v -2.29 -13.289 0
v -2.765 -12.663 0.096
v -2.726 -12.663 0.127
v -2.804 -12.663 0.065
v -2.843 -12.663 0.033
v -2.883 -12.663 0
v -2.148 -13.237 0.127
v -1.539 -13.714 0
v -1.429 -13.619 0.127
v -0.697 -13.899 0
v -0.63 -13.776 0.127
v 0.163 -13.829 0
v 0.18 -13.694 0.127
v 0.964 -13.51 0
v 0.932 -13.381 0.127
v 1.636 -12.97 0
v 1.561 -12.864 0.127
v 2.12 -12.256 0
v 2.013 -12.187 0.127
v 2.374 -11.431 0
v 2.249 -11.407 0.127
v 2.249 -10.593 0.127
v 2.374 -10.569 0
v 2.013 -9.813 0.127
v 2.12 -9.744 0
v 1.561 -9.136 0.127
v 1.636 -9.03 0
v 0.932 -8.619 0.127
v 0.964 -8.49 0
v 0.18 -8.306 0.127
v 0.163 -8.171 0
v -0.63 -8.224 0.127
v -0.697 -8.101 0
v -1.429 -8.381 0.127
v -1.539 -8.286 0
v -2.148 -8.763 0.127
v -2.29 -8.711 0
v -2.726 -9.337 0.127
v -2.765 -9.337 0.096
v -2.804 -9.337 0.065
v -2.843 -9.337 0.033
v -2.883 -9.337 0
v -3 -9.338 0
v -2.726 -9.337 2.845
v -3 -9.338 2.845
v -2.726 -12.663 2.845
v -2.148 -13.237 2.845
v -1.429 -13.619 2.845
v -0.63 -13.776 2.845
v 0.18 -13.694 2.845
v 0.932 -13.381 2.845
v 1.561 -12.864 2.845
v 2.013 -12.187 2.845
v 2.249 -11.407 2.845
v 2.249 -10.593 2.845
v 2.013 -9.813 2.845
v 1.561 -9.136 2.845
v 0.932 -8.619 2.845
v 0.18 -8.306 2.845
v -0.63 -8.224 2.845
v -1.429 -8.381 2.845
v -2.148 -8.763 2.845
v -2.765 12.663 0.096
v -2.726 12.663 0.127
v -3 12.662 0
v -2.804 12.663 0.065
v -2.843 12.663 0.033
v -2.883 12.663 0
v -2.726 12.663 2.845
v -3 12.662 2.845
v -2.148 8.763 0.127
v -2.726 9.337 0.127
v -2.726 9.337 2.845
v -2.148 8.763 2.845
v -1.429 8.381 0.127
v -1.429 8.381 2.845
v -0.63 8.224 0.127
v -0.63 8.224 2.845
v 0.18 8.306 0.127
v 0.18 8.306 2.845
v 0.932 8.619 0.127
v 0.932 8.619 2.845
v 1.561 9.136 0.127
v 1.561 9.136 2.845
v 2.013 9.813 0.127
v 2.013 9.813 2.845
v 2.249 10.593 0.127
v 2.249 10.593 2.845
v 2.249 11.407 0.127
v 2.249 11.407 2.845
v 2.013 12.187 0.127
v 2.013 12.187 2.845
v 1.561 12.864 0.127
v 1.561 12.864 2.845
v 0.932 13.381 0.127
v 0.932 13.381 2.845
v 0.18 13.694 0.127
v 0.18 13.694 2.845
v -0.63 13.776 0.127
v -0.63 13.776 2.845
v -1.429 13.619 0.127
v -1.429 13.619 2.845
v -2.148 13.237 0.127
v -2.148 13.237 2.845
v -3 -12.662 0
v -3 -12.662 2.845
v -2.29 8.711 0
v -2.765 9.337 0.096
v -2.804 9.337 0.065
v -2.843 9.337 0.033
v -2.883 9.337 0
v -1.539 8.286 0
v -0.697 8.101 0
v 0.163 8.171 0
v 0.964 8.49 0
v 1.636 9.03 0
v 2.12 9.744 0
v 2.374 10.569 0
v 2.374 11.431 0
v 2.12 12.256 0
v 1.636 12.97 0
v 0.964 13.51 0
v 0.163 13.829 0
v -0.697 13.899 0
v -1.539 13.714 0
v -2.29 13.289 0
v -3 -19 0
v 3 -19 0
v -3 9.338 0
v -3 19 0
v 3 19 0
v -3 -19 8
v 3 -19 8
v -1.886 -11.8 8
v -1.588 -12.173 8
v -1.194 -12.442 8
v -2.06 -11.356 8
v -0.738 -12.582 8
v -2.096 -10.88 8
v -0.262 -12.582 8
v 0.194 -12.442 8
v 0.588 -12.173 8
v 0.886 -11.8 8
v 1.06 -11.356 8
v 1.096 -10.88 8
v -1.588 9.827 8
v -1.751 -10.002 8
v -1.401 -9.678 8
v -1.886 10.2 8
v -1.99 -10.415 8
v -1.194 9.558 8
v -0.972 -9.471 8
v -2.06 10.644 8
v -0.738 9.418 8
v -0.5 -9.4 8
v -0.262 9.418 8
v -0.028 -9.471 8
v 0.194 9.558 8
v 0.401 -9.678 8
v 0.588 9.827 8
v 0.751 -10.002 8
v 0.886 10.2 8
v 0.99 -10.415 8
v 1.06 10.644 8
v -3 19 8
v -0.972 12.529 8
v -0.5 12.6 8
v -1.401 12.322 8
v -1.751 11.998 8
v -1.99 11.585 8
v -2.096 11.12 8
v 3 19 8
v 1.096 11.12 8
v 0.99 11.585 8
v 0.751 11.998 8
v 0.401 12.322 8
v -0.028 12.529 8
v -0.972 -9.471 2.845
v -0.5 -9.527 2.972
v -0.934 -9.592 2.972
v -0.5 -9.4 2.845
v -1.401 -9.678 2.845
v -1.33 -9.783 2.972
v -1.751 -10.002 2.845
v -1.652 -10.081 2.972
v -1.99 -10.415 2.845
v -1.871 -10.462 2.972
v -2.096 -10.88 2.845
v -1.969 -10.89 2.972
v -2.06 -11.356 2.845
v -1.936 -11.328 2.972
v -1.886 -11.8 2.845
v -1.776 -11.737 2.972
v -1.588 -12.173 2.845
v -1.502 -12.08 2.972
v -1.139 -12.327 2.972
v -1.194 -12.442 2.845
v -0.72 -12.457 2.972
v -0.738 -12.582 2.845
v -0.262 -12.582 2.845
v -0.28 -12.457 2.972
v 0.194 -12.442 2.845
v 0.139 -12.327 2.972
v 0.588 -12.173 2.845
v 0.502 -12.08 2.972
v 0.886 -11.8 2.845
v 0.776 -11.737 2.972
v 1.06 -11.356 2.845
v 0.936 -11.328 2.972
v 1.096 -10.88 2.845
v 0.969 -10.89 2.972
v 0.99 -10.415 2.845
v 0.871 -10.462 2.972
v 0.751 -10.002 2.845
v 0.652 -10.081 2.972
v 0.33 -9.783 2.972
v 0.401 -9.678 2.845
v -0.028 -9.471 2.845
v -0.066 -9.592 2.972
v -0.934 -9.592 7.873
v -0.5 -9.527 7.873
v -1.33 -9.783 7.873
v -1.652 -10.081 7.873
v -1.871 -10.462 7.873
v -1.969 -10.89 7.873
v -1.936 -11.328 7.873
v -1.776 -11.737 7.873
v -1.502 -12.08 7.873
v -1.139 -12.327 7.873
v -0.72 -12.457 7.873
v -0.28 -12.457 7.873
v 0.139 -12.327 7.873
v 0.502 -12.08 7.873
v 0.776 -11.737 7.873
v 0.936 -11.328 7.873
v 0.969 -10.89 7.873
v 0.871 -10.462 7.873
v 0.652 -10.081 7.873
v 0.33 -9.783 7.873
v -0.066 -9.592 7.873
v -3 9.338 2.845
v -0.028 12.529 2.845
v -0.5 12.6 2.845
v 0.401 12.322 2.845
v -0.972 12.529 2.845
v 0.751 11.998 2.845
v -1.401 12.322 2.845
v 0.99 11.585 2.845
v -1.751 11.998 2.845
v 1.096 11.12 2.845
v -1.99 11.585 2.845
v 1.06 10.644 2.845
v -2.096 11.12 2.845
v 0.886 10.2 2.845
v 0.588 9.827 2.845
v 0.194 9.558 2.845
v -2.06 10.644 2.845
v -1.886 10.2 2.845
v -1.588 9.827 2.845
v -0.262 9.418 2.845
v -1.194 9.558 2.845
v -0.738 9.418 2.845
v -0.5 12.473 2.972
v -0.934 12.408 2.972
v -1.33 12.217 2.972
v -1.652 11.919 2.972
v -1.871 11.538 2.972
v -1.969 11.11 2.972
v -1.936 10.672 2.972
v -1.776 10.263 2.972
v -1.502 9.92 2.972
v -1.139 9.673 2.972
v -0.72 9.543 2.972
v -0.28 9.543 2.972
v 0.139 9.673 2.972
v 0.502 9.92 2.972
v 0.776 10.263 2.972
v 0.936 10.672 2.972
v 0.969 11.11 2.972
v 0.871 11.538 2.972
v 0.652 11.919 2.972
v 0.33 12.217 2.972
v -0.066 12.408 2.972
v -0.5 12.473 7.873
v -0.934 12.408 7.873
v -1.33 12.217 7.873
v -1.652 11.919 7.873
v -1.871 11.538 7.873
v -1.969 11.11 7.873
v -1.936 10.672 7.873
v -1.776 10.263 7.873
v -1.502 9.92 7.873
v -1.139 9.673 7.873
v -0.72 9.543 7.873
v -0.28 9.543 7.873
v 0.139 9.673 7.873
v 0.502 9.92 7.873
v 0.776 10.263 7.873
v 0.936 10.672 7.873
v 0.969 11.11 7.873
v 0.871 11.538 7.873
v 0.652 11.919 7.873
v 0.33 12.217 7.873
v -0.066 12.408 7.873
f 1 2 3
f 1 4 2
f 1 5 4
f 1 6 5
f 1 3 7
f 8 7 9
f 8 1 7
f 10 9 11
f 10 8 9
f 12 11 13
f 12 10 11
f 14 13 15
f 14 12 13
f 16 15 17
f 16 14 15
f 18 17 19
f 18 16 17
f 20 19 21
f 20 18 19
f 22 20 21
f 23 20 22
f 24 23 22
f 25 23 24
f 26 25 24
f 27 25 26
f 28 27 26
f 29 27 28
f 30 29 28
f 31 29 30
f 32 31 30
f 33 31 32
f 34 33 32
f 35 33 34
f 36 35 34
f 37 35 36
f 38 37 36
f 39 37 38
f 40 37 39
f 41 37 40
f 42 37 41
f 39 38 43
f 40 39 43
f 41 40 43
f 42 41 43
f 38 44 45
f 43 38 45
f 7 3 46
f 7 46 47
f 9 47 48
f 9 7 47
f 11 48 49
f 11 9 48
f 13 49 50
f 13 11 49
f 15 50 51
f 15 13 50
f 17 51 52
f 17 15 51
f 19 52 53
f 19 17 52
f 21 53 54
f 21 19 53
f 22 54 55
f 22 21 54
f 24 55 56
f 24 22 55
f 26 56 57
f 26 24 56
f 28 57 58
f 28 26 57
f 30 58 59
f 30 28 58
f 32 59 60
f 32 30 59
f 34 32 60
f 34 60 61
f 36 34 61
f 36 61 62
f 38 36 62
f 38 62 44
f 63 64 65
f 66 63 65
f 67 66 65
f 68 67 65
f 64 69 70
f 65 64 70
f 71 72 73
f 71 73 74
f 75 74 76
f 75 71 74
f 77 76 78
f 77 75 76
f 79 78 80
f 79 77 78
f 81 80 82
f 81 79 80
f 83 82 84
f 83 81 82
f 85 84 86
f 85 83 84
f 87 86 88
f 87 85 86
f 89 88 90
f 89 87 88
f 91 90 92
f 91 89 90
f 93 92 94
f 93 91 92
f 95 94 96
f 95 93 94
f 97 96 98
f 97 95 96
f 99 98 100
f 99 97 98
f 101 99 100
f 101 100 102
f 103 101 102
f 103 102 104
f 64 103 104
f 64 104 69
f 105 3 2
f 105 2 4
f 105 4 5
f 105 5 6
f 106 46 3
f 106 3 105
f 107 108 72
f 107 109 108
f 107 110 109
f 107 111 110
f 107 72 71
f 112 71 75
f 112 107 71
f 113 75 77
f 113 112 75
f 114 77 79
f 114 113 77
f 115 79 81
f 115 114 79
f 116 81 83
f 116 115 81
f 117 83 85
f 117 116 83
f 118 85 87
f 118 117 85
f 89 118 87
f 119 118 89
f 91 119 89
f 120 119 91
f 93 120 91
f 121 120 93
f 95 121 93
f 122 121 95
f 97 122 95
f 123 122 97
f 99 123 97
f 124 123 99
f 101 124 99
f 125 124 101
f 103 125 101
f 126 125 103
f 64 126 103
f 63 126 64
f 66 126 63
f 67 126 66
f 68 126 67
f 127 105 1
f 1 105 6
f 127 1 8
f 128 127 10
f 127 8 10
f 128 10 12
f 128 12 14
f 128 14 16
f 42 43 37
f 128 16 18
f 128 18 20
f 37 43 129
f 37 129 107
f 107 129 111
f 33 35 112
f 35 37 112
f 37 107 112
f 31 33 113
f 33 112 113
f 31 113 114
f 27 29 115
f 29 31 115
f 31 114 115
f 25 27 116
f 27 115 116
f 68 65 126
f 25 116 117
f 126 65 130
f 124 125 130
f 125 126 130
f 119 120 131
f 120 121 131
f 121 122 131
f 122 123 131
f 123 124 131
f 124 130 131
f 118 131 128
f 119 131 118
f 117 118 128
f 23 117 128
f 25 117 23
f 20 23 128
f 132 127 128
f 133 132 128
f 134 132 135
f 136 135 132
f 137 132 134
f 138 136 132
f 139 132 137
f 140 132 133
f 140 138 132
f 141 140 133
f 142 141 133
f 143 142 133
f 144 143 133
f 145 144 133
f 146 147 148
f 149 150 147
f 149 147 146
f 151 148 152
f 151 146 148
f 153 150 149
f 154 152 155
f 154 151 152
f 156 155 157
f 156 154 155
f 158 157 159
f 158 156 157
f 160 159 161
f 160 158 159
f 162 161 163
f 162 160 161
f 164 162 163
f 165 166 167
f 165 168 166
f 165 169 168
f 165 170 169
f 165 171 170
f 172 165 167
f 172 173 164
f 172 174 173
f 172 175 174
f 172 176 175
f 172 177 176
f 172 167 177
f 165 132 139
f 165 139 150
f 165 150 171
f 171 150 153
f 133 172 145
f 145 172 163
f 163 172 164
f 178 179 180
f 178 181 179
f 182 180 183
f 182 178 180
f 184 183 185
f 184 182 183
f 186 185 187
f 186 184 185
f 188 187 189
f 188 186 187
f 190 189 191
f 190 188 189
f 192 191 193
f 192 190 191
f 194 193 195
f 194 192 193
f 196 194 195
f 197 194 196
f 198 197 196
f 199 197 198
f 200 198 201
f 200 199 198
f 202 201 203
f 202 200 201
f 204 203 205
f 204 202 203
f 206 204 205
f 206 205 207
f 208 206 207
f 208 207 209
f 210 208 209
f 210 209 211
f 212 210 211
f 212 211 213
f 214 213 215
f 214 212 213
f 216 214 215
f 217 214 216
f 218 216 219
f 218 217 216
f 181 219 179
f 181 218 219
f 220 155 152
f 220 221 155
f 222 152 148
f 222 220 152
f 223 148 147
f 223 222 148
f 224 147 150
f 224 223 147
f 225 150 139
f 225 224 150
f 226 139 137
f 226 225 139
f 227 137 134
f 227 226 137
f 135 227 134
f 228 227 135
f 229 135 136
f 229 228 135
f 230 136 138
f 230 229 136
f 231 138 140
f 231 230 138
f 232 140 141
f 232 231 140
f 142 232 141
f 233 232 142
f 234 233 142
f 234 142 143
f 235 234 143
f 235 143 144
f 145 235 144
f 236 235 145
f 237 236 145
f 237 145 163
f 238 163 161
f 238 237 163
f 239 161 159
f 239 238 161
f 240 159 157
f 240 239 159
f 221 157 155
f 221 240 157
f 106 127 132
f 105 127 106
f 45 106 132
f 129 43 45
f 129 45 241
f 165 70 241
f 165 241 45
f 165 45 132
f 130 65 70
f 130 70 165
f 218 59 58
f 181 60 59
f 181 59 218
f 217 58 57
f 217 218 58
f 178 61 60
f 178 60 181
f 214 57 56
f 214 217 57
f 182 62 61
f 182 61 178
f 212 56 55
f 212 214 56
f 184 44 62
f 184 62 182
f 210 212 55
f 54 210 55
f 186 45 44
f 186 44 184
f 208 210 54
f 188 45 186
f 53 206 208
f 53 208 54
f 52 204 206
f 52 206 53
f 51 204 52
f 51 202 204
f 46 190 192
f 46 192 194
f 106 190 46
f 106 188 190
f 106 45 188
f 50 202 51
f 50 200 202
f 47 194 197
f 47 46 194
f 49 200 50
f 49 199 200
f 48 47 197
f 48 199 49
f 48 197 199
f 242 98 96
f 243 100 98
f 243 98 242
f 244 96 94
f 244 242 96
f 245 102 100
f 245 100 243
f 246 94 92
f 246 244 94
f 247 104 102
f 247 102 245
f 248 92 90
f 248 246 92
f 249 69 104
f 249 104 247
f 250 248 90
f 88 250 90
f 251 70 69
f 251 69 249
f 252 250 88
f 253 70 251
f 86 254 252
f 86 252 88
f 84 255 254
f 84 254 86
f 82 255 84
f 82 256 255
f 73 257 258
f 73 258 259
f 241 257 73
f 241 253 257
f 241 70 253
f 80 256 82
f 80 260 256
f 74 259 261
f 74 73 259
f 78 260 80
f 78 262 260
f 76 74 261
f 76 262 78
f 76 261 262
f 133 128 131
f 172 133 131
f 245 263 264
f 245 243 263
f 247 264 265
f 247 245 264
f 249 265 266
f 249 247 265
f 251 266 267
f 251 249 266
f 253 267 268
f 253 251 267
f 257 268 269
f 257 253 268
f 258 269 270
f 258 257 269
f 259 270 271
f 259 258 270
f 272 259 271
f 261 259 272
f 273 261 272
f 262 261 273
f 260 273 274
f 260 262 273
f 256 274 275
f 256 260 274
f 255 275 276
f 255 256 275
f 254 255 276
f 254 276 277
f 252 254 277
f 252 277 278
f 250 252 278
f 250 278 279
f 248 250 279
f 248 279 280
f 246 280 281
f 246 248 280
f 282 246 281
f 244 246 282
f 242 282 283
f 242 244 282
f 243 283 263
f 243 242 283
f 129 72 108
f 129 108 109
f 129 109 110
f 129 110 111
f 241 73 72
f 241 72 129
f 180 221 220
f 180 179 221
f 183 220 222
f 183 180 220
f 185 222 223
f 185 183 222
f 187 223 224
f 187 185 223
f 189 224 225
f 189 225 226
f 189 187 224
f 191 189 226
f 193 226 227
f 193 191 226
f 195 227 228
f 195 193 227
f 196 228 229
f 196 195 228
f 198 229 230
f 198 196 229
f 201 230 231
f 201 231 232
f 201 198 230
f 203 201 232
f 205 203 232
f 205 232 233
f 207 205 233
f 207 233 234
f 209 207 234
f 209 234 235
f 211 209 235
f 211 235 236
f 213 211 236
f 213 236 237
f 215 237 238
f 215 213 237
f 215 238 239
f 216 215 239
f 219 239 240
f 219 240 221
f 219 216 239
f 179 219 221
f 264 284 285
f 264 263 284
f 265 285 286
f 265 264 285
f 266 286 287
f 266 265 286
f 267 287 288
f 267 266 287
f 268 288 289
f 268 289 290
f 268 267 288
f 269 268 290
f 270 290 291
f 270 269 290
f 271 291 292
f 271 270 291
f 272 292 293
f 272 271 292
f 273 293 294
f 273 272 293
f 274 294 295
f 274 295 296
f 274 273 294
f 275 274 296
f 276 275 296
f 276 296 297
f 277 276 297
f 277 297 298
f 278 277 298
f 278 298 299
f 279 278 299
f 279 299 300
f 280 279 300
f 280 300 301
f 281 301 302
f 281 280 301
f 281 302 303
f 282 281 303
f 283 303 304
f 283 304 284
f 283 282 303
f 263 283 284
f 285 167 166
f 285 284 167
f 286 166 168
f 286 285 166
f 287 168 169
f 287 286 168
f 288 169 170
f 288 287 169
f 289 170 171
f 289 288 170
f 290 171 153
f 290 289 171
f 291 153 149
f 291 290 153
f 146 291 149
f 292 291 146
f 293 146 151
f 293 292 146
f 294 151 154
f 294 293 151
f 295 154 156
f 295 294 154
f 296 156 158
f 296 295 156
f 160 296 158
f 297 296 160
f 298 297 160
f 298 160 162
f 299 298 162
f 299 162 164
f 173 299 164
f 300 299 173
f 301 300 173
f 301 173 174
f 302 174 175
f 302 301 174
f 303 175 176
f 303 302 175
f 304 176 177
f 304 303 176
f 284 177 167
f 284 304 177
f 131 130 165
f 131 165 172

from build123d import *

# Parameters (mm, degrees)
SKETCH_1_W                = 6
SKETCH_1_H                = 38
EXTRUDE_1_DEPTH           = 8
HOLE_WIZARD_41_AT_2_COUNT = 2
HOLE_WIZARD_41_AT_2_PITCH = 22
CHAMFER_1_SIZE            = 0.449397949


with BuildPart() as part:
    # Эскиз1 → Бобышка-Вытянуть1 (new body)
    with BuildSketch(Plane.XY):
        Rectangle(SKETCH_1_W, SKETCH_1_H)
    extrude(amount=EXTRUDE_1_DEPTH)

    # Эскиз2 → Цековка для  винта с внутренним шестигранником #41 (revolve, cut)
    with BuildSketch(Plane(origin=(-0.5, 11, 0), x_dir=(0, 1, 0), z_dir=(1, 0, 0))):
        Polygon((0, 0), (0, 8), (1.6002, 8), (1.4732, 7.873), (1.4732, 2.9718), (1.6002, 2.8448), (2.77876, 2.8448), (2.77876, 0.127), (2.90576, 0), align=None)
    hole_wizard_41 = revolve(axis=Axis((-0.5, 11, -6.35), (0, 0, 1)), mode=Mode.SUBTRACT)

    # Цековка для  винта с внутренним шестигранником #41 at 2: Цековка для  винта с внутренним шестигранником #41 ×2
    with Locations(*[(0, -i * HOLE_WIZARD_41_AT_2_PITCH, 0) for i in range(1, HOLE_WIZARD_41_AT_2_COUNT)]):
        add(hole_wizard_41, mode=Mode.SUBTRACT)

    # Фаска1
    # the kernel refuses this chamfer: 0.5, 0.449397949 mm, written as the material it takes off along each edge
    with BuildSketch(Plane(origin=(-3, -9.786943061, 2.8448), x_dir=(0.5198491944846584, 0.8542580494169496, 0), z_dir=(0, 0, -1)), Plane(origin=(-3, 12.213056939, 2.8448), x_dir=(0.5198491944846584, 0.8542580494169496, 0), z_dir=(0, 0, -1))) as chamfer_1_piece_1:
        with BuildLine():
            Line((0.526718663, 0), (CHAMFER_1_SIZE * 0.854258048776, -CHAMFER_1_SIZE * 0.519849194094))
            Line((CHAMFER_1_SIZE * 0.854258048776, -CHAMFER_1_SIZE * 0.519849194094), (0, 0))
            ThreePointArc((0, 0), (0.268614935, -0.012503234), (0.526718663, 0))
        make_face()
    extrude(amount=4.061353185, mode=Mode.SUBTRACT)
    with BuildSketch(Plane(origin=(-3, -12.213056939, 2.8448), x_dir=(0.519849194484659, -0.8542580494169493, 0), z_dir=(0, 0, -1)), Plane(origin=(-3, 9.786943061, 2.8448), x_dir=(0.519849194484659, -0.8542580494169493, 0), z_dir=(0, 0, -1))) as chamfer_1_piece_2:
        with BuildLine():
            Line((0.526718663, 0), (CHAMFER_1_SIZE * 0.854258048776, CHAMFER_1_SIZE * 0.519849194094))
            Line((CHAMFER_1_SIZE * 0.854258048776, CHAMFER_1_SIZE * 0.519849194094), (0, 0))
            ThreePointArc((0, 0), (0.268614935, 0.012503234), (0.526718663, 0))
        make_face()
    extrude(amount=4.061353185, mode=Mode.SUBTRACT)


solid = part.part
